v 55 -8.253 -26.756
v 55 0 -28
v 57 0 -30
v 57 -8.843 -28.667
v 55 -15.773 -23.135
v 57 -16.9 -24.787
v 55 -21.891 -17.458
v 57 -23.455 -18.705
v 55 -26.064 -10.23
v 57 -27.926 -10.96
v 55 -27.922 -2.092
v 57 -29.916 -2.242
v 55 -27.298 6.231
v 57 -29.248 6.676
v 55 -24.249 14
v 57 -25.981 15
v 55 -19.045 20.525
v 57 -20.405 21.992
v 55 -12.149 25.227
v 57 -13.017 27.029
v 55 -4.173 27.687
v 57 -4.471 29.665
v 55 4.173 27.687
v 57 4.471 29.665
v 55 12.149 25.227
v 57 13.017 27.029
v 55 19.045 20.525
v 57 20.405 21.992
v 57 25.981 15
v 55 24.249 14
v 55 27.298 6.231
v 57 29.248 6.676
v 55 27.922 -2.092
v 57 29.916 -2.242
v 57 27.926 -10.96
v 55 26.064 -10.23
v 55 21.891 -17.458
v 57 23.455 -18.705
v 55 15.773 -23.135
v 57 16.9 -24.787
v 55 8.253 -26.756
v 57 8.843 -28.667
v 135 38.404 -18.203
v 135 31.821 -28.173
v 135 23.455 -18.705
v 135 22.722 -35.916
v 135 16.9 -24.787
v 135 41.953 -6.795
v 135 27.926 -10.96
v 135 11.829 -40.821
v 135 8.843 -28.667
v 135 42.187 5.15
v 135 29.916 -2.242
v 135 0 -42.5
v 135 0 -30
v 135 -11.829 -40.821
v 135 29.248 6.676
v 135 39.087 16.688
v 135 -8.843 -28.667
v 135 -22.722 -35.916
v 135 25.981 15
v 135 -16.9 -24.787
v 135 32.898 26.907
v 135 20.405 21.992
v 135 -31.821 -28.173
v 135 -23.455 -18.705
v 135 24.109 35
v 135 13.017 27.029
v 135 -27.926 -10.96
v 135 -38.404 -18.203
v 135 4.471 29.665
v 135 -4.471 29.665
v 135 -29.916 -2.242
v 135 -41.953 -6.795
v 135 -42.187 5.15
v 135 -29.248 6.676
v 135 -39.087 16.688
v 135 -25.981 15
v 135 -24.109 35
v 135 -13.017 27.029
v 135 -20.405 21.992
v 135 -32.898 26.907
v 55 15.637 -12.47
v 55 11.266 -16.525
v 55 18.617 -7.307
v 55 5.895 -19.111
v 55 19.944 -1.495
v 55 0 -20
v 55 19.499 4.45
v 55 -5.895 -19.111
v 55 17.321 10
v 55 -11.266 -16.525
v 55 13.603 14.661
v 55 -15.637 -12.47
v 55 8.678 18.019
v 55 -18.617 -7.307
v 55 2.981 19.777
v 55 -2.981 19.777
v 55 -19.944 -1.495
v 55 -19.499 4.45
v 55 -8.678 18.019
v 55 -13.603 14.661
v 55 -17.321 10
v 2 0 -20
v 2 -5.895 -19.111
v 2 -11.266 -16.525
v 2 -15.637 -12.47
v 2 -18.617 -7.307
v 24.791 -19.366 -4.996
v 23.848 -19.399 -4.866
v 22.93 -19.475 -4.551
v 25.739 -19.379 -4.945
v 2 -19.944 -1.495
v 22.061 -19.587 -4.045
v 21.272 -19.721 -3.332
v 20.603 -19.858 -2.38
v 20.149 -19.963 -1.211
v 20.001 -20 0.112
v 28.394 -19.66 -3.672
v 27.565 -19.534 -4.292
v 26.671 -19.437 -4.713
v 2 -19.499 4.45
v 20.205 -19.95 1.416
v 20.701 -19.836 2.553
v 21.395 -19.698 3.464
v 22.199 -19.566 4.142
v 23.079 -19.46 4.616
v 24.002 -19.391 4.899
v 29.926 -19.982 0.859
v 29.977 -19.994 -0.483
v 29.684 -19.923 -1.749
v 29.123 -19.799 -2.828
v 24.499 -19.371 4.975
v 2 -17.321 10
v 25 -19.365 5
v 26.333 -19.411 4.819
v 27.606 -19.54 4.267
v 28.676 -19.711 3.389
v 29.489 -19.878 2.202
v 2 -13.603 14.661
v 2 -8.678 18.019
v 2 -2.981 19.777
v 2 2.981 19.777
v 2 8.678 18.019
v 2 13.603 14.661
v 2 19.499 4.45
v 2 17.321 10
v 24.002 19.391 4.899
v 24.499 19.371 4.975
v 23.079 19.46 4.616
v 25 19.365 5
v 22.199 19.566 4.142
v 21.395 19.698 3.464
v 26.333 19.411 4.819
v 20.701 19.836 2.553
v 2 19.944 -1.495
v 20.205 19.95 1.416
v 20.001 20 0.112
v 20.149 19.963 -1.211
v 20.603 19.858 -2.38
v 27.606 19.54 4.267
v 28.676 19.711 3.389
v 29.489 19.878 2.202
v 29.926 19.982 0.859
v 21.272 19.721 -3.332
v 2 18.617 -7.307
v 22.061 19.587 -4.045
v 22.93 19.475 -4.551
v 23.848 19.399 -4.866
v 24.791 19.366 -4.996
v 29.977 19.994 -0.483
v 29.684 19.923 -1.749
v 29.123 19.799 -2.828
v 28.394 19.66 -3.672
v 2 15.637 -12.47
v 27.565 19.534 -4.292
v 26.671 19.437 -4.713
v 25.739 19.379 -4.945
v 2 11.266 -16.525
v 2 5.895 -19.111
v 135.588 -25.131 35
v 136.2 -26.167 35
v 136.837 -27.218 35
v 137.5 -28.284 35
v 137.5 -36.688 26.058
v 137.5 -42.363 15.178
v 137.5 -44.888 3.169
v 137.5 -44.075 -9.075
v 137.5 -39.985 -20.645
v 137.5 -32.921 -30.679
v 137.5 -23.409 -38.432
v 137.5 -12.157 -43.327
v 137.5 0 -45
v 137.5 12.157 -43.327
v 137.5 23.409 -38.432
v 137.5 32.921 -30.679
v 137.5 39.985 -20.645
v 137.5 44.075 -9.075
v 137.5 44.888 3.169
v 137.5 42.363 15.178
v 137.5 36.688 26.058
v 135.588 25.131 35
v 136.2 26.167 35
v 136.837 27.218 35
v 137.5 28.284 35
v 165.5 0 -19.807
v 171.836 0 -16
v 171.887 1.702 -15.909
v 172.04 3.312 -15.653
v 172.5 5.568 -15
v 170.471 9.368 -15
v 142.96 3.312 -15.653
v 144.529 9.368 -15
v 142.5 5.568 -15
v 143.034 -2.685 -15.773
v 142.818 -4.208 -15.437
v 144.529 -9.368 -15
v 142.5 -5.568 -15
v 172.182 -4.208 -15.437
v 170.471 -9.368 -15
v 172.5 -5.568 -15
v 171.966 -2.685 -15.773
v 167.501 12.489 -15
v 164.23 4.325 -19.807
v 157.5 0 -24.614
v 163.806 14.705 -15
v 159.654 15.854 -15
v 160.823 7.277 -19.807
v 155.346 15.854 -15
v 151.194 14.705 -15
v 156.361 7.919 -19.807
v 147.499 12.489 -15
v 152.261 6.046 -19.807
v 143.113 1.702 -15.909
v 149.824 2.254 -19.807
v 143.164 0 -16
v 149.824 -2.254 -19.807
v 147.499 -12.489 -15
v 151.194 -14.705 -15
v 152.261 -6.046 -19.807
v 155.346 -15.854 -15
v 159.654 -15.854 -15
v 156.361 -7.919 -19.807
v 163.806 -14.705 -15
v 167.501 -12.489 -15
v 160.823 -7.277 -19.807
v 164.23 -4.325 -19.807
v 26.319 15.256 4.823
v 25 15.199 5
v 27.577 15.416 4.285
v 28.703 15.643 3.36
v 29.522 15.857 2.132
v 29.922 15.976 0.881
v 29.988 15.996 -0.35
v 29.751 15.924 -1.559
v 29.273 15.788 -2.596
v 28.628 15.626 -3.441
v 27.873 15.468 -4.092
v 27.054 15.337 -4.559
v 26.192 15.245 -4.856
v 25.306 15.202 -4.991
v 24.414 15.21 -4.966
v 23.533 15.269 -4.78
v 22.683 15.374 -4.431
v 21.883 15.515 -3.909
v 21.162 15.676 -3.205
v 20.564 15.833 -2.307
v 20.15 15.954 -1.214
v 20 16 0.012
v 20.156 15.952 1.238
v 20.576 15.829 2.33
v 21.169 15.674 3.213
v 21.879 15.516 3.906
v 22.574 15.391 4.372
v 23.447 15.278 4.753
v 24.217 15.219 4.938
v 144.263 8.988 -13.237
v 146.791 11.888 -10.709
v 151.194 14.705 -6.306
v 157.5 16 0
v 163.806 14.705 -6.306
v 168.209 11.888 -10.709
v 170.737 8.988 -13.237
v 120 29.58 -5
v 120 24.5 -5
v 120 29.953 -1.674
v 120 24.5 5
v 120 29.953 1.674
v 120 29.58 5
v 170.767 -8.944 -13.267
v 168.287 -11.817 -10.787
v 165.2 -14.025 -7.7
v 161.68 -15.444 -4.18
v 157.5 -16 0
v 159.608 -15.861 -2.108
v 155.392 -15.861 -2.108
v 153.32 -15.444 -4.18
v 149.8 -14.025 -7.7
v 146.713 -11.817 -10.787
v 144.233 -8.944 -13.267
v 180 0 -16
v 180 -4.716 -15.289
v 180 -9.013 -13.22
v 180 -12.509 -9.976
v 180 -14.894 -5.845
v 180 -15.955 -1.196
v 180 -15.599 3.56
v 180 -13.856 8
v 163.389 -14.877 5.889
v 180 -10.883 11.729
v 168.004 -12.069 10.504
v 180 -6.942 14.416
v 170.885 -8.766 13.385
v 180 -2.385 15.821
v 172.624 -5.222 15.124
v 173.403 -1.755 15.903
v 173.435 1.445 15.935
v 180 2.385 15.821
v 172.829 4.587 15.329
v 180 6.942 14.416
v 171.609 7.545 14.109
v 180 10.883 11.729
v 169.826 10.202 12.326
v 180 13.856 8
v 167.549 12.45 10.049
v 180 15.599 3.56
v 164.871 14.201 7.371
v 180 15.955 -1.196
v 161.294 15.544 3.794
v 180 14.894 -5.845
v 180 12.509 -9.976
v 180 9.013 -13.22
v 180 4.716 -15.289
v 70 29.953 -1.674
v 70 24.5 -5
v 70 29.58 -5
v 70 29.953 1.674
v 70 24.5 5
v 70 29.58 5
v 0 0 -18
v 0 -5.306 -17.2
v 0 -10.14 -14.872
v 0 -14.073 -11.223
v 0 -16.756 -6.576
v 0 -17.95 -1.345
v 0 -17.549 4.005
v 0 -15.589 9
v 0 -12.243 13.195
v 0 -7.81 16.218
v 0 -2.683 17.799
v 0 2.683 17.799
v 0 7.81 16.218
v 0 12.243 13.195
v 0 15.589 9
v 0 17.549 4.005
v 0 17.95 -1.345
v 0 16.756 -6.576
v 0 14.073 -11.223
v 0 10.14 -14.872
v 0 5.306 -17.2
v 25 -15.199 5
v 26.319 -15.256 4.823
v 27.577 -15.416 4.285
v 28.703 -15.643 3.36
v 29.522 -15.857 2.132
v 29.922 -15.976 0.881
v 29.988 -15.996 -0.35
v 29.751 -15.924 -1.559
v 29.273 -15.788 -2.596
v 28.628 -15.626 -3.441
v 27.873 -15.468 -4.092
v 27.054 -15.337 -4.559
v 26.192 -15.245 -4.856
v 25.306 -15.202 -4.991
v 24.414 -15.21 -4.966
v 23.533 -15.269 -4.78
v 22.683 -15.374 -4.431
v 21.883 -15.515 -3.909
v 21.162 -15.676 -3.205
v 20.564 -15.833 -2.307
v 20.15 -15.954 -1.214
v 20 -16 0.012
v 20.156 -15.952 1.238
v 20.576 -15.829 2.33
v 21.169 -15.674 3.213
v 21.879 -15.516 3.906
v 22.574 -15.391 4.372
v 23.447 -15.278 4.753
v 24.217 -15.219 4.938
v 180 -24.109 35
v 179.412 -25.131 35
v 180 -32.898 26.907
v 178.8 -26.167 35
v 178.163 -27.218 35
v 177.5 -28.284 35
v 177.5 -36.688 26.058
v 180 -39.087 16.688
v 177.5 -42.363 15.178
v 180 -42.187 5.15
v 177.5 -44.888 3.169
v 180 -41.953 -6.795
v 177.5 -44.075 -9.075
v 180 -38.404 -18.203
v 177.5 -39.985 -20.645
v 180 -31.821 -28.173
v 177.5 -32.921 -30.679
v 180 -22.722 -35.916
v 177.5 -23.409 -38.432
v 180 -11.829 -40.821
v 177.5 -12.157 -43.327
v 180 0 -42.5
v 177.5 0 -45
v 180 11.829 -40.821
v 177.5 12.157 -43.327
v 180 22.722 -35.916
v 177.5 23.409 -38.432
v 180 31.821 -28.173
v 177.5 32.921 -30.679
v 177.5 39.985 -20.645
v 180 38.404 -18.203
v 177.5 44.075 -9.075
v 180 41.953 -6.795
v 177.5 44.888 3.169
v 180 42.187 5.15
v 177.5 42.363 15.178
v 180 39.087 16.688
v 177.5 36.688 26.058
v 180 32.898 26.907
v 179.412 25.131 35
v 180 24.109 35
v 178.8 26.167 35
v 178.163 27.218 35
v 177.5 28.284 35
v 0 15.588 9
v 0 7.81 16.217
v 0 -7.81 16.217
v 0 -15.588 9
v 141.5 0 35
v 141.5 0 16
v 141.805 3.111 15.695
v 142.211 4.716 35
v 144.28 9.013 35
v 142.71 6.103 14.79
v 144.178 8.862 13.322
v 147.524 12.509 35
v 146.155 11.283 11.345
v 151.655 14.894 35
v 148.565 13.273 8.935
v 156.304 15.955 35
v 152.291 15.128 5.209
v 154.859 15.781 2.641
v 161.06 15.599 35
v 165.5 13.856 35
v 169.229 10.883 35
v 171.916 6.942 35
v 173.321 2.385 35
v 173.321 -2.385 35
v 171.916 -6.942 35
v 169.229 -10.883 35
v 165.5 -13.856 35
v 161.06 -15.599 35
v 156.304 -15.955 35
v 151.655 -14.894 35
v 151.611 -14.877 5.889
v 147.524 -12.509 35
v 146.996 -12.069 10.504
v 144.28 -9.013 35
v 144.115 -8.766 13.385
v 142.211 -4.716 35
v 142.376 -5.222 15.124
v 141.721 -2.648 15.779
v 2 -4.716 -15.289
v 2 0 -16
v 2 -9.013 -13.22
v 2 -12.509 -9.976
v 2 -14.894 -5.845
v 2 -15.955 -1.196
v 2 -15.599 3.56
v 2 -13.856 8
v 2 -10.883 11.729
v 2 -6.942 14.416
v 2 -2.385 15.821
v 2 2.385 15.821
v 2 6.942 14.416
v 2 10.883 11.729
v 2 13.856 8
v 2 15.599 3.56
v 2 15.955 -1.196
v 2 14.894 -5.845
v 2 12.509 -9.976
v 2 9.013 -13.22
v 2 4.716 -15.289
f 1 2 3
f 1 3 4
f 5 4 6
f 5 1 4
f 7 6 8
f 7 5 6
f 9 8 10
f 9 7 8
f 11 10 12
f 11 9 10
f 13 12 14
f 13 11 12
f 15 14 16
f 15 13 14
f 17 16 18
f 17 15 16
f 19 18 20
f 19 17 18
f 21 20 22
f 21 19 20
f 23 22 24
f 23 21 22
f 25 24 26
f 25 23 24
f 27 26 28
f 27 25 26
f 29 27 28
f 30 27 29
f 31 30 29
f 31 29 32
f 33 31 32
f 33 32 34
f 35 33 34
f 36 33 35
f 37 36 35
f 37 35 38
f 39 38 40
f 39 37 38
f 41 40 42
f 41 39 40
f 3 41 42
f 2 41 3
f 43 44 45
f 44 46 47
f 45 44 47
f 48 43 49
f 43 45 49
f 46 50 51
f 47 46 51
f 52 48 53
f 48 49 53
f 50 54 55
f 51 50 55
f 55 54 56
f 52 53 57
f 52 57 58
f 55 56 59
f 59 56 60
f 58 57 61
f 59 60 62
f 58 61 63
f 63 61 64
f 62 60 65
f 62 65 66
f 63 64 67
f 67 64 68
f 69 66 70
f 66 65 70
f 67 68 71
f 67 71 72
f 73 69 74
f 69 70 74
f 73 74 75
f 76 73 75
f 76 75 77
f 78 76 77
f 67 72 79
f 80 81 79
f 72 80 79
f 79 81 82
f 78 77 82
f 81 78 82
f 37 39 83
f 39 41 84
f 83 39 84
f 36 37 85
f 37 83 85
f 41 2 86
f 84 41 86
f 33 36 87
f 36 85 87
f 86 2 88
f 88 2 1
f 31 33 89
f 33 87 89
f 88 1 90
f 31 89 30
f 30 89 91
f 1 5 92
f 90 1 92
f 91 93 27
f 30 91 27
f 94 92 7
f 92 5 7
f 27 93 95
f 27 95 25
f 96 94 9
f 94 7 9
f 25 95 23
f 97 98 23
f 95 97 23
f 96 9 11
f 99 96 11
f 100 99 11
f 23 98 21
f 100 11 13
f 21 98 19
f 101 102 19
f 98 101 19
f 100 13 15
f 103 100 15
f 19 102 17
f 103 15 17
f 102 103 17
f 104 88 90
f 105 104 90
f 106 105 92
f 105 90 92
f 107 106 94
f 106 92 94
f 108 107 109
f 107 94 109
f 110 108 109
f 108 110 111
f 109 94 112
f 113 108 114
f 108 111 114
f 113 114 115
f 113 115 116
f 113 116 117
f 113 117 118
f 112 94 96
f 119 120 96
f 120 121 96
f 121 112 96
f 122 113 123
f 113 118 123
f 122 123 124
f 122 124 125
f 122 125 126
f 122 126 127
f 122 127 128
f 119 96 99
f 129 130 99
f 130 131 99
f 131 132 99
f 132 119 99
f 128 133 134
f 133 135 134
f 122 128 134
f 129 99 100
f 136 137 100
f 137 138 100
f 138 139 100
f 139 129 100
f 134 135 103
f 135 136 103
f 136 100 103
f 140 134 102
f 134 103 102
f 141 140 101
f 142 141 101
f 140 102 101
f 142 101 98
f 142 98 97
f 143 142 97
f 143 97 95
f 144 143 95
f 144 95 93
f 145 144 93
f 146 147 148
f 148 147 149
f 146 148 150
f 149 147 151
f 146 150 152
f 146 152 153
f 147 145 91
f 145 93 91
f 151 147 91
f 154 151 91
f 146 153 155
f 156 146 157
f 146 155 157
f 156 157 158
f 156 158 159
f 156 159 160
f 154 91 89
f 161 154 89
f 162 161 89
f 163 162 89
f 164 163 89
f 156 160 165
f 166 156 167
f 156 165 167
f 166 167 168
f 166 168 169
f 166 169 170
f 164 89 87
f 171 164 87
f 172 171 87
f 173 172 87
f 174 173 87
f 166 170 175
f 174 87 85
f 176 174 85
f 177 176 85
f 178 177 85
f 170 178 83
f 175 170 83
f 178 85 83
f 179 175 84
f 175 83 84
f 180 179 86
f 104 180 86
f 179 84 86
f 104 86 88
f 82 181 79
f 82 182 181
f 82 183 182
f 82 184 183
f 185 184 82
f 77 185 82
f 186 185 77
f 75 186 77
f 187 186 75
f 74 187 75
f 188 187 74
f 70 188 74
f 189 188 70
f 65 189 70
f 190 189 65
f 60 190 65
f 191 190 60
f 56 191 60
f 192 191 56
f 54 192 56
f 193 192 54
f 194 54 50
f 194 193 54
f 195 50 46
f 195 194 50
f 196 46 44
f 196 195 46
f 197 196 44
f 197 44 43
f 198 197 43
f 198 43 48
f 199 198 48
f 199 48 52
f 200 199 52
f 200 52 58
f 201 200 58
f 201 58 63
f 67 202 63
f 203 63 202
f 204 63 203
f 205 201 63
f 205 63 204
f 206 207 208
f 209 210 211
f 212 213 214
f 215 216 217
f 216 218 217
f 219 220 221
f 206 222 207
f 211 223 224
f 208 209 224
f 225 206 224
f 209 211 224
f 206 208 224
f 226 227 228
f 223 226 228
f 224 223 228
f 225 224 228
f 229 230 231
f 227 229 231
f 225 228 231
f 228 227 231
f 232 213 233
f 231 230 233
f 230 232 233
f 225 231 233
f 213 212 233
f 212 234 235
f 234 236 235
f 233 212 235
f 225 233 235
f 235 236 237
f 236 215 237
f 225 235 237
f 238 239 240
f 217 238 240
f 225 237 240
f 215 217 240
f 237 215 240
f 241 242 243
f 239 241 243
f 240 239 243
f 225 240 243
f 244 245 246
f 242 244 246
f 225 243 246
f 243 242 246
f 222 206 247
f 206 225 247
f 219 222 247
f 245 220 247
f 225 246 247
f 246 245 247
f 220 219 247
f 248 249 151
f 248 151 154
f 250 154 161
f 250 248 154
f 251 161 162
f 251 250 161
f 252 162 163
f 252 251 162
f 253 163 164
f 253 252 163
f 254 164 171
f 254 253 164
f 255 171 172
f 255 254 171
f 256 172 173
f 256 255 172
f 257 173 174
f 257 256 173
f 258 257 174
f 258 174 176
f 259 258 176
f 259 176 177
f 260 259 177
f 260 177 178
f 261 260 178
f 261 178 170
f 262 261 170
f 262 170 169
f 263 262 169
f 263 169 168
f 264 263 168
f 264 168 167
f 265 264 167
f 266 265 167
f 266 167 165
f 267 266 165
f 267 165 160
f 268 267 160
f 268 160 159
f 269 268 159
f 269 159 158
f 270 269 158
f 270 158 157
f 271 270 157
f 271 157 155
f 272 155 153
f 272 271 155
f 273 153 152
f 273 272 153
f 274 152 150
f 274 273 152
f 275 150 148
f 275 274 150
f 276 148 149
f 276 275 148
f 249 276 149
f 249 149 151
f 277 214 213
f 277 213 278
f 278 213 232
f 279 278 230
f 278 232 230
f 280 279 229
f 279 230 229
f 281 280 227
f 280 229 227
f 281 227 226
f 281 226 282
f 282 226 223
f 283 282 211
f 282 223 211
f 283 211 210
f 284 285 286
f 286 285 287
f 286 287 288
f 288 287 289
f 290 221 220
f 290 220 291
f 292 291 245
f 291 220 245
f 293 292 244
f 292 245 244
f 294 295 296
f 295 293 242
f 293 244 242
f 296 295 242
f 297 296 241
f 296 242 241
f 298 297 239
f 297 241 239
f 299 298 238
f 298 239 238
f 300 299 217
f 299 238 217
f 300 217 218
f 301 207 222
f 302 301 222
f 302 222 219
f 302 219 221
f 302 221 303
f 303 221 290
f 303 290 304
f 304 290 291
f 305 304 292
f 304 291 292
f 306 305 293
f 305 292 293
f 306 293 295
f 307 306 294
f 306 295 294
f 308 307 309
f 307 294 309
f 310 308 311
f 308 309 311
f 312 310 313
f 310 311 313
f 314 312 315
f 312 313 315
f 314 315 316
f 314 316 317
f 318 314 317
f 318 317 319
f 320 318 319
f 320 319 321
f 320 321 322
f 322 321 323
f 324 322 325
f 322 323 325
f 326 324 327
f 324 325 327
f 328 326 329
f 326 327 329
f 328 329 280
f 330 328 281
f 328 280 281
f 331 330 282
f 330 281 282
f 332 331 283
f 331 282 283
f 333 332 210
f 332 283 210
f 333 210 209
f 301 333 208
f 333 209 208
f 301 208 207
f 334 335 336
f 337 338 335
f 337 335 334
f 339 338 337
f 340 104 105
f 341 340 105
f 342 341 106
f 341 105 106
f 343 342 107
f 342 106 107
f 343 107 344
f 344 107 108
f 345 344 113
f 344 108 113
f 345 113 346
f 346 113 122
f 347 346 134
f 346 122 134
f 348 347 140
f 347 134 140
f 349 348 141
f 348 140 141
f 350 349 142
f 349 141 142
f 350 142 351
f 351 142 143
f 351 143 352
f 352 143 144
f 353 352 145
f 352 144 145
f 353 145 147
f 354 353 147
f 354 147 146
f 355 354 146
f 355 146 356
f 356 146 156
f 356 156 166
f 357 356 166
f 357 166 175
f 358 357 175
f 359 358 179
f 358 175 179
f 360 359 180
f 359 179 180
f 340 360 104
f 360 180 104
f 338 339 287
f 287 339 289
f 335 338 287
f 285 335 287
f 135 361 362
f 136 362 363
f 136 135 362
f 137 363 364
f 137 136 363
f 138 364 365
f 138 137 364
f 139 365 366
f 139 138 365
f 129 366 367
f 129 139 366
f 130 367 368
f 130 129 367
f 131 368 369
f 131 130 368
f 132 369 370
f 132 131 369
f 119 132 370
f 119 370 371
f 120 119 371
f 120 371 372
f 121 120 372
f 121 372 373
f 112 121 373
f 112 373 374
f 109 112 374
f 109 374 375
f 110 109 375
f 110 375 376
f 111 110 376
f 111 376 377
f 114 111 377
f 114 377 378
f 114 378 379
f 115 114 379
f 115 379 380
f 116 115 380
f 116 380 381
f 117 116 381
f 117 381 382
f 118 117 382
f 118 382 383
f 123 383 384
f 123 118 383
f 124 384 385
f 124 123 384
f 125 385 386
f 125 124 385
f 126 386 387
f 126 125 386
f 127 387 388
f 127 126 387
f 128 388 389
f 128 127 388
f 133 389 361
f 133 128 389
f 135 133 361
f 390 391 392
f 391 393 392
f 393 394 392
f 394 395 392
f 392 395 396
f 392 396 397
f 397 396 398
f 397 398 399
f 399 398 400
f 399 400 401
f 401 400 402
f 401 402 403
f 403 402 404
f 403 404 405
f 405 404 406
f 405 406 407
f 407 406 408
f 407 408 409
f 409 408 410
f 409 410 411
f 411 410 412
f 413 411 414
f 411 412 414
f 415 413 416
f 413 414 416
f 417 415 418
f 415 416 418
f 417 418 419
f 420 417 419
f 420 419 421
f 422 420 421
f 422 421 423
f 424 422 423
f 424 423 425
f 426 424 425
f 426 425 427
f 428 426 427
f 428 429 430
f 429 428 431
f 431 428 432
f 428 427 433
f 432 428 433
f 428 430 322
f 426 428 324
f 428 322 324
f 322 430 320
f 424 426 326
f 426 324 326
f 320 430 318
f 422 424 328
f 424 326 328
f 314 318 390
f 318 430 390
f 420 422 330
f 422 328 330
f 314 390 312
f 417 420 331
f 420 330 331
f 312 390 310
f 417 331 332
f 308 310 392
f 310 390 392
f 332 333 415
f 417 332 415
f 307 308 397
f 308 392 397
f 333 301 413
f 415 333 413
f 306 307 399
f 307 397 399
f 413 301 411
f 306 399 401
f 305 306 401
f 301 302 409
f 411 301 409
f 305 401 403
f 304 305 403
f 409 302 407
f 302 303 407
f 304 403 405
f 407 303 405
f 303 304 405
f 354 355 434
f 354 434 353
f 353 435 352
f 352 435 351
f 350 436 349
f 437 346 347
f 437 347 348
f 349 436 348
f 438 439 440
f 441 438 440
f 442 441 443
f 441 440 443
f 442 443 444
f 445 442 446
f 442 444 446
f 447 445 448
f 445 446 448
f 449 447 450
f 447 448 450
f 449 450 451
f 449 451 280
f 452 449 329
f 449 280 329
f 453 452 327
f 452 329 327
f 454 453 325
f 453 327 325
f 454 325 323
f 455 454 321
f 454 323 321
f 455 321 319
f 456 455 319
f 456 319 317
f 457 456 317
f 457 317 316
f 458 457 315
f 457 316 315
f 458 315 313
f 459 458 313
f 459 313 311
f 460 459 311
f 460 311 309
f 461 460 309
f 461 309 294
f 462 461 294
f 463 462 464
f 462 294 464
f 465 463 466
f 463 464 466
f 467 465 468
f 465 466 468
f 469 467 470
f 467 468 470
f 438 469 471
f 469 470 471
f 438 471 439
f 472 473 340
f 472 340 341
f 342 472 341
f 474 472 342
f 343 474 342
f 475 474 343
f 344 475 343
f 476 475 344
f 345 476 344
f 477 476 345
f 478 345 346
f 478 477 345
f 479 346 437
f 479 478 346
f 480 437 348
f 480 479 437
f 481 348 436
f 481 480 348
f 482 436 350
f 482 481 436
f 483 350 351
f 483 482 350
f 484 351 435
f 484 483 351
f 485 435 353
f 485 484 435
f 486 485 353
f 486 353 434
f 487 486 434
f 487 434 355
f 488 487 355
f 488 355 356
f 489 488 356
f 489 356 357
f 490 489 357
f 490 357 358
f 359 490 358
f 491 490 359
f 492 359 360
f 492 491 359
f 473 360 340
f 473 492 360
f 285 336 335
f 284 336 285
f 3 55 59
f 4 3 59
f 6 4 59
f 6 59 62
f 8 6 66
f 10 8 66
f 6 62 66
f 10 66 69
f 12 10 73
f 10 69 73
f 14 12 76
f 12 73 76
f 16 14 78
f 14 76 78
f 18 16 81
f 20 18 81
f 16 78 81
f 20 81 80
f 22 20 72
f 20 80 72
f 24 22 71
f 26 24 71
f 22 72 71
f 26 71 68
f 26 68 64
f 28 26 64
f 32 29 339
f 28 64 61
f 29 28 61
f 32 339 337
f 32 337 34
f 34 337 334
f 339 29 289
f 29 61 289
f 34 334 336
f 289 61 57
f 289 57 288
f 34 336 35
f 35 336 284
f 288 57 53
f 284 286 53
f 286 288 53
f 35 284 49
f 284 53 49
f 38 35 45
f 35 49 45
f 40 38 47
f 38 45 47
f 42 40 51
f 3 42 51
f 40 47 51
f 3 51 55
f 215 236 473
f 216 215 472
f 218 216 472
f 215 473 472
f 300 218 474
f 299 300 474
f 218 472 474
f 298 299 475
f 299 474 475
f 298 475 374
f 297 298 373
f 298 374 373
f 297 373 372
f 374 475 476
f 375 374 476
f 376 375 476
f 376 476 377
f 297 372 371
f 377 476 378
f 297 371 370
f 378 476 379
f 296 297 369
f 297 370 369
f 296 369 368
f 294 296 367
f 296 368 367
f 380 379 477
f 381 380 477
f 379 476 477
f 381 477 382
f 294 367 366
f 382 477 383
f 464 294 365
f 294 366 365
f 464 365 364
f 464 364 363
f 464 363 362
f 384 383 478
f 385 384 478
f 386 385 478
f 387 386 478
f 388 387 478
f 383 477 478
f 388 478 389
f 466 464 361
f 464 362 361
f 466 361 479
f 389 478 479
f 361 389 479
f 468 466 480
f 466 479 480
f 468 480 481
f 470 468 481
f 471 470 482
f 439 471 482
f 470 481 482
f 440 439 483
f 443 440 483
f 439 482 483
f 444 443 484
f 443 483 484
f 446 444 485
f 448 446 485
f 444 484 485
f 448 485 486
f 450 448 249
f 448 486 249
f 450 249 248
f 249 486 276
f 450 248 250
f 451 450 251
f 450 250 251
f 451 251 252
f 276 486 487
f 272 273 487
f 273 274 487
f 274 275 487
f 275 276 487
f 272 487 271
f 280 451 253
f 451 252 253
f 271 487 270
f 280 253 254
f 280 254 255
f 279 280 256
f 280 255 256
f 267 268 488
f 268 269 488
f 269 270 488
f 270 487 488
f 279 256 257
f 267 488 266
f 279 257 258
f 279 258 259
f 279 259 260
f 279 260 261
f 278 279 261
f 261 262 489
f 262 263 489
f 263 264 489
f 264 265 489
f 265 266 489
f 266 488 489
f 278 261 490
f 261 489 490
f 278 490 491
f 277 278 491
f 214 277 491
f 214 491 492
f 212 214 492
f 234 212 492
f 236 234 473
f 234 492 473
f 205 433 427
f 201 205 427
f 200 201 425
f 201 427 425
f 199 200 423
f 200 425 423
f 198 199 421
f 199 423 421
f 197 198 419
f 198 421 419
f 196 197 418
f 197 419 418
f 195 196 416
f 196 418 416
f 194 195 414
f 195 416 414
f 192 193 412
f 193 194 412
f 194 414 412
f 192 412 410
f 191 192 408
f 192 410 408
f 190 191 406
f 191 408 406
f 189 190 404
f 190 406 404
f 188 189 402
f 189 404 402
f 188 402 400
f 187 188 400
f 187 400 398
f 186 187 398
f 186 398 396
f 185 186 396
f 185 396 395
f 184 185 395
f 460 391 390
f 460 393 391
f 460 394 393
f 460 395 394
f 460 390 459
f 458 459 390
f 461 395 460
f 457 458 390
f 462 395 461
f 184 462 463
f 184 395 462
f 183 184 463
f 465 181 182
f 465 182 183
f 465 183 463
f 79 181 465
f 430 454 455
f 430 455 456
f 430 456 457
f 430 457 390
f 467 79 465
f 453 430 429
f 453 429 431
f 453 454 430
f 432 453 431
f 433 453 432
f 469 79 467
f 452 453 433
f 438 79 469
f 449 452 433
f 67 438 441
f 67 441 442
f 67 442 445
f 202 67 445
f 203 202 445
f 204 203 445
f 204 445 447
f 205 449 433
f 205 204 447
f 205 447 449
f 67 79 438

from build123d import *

# Parameters (mm, degrees)
CUT_EXTRUDE_9_DEPTH         = 191.91883092
CUT_EXTRUDE_9_DEPTH_BACK    = 191.91883092
SKETCH_6_W                  = 50
SKETCH_6_H                  = 5.5
CUT_EXTRUDE_4_DEPTH         = 5
CUT_EXTRUDE_10_DEPTH        = 191.91883092
CUT_EXTRUDE_10_DEPTH_BACK   = 191.91883092
SKETCH_16_R                 = 5
HOLE_WIZARD_0_15_32_1_D     = 32
HOLE_WIZARD_0_15_32_1_DEPTH = 50
HOLE_WIZARD_0_15_32_1_TIP   = 9.613769904
CHAMFER_3_SIZE              = 2
CHAMFER_4_SIZE              = 2.5
CHAMFER_5_SIZE              = 2


with BuildPart() as part:
    # Эскиз1 → Повернуть1 (revolve)
    with BuildSketch(Plane.XY, mode=Mode.PRIVATE) as revolve_1_sk:
        Polygon((0, 16), (0, 20), (55, 20), (55, 30), (135, 30), (135, 45), (180, 45), (180, 16), align=None)
    revolve(revolve_1_sk.sketch.rotate(Axis((0, 0, 0), (-1, 0, 0)), 90), axis=Axis((0, 0, 0), (-1, 0, 0)))

    # Эскиз15 → Вырез-Вытянуть9 (cut, two sides: drawn at the far end of the back side and taken through both)
    with BuildSketch(Plane(origin=(180, 0, 0), x_dir=(0, 0, -1), z_dir=(1, 0, 0)).offset(-CUT_EXTRUDE_9_DEPTH_BACK)):
        with BuildLine():
            Line((-35, -28.284271247), (-35, 28.284271247))
            ThreePointArc((-35, 28.284271247), (-45, 0), (-35, -28.284271247))
        make_face()
    extrude(amount=CUT_EXTRUDE_9_DEPTH + CUT_EXTRUDE_9_DEPTH_BACK, mode=Mode.SUBTRACT)

    # Эскиз6 → Вырез-Вытянуть4 (cut, symmetric)
    with BuildSketch(Plane.XY):
        with Locations((95, 27.25)):
            Rectangle(SKETCH_6_W, SKETCH_6_H)
    extrude(amount=CUT_EXTRUDE_4_DEPTH, both=True, mode=Mode.SUBTRACT)

    # Эскиз16 → Вырез-Вытянуть10 (cut, two sides: drawn at the far end of the back side and taken through both)
    with BuildSketch(Plane(origin=(0, 0, 0), x_dir=(1, 0, 0), z_dir=(0, 1, 0)).offset(-CUT_EXTRUDE_10_DEPTH_BACK)):
        with Locations(Location((25, 0, 0), (0, 0, 270))):
            Circle(SKETCH_16_R)
    extrude(amount=CUT_EXTRUDE_10_DEPTH + CUT_EXTRUDE_10_DEPTH_BACK, mode=Mode.SUBTRACT)

    # Диаметр отверстия Ø0.15 (32)1
    with Locations(Plane.XY.offset(35)):
        with Locations((157.5, 0)):
            Hole(HOLE_WIZARD_0_15_32_1_D / 2, depth=HOLE_WIZARD_0_15_32_1_DEPTH)
            with Locations((0, 0, -(HOLE_WIZARD_0_15_32_1_DEPTH + HOLE_WIZARD_0_15_32_1_TIP / 2))):  # 118° drill point
                Cone(0, HOLE_WIZARD_0_15_32_1_D / 2, HOLE_WIZARD_0_15_32_1_TIP, mode=Mode.SUBTRACT)

    # Фаска3
    chamfer_3_edges = [part.edges().sort_by_distance(p)[0] for p in [
        (0, 0, 16),
        (0, 0, 20),
    ]]
    chamfer(chamfer_3_edges, length=CHAMFER_3_SIZE - 0.0001)  # a hair under: the kernel refuses the full size

    # Фаска4
    chamfer_4_edges = [part.edges().sort_by_distance(p)[0] for p in [
        (180, 0, -45),
        (135, 0, -45),
    ]]
    chamfer(chamfer_4_edges, length=CHAMFER_4_SIZE)

    # Фаска5
    chamfer_5_edges = [part.edges().sort_by_distance(p)[0] for p in [
        (55, 0, 30),
    ]]
    chamfer(chamfer_5_edges, length=CHAMFER_5_SIZE)


solid = part.part
